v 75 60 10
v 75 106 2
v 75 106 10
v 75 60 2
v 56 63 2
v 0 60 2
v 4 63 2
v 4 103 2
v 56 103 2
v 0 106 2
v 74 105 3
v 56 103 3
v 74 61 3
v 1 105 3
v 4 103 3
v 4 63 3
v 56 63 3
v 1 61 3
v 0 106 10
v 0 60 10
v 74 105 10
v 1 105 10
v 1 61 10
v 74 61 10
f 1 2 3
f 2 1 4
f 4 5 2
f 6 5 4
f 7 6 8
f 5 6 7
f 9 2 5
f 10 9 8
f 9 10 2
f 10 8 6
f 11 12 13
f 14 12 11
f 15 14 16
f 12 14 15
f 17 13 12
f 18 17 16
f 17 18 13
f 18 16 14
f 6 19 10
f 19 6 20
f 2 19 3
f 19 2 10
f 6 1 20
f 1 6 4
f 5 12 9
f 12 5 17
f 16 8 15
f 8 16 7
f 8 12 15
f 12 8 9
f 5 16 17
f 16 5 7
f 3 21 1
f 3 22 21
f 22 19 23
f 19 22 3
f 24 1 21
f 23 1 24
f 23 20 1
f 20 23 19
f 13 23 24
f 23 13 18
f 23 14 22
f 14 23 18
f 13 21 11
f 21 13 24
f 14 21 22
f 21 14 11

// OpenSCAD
module topcase(w,d,h,t) {

cube([w,t,h]);
cube([t,d,h]);
translate([w-t,0,0])  cube([t,d,h]);
translate([0,d-t,0])  cube([w,t,h]);

// top
difference(){
    translate([0,0,h-t]) difference() {
        cube([w,d,t]);
        translate([4,3,-1]) cube([52,40,3]);
    }
}

}


module bottomcase(w,d,h,t) {
    difference() {
        bottomcase_base(w,d,h,t);
        translate([-1,15,3])  cube([12,15,5]);
    }
}

module bottomcase_base(w,d,h,t) {
cube([w,t,h]);
cube([t,d,h]);
translate([w-t,0,0])  cube([t,d,h]);
translate([0,d-t,0])  cube([w,t,h]);

//inner wall
translate([t,t,t]) { cube([w-t*2,t,h+2]);  
                     cube([t,d-t*2,h+2]); 
}
translate([w-t*2,t,t])  cube([t,d-t*2,h+2]);
translate([t,d-t*2,t])  cube([w-t*3,t,h+2]);   

// bottom
difference(){
    translate([0,0,0]) difference() {
        cube([w,d,t]);
        translate([22,13,-1])  cylinder(h=5,r= 5);
    }
}


translate([t,t,t])     cube([55,2.5,5]);  
translate([t,t+40,t])  cube([55,3, 5]);
translate([t,t,t])     cube([4,40, 3]);
  

//board-osae
translate([w-14-t,t,t])     cube([15,20, 6]);
}


h1=8;
h2=10;
w=75;
d=46;
t=1;

translate([0,60,10]) mirror([0,0,1]) topcase(w,d,h1,t);
//bottomcase(w,d,h2,t);
